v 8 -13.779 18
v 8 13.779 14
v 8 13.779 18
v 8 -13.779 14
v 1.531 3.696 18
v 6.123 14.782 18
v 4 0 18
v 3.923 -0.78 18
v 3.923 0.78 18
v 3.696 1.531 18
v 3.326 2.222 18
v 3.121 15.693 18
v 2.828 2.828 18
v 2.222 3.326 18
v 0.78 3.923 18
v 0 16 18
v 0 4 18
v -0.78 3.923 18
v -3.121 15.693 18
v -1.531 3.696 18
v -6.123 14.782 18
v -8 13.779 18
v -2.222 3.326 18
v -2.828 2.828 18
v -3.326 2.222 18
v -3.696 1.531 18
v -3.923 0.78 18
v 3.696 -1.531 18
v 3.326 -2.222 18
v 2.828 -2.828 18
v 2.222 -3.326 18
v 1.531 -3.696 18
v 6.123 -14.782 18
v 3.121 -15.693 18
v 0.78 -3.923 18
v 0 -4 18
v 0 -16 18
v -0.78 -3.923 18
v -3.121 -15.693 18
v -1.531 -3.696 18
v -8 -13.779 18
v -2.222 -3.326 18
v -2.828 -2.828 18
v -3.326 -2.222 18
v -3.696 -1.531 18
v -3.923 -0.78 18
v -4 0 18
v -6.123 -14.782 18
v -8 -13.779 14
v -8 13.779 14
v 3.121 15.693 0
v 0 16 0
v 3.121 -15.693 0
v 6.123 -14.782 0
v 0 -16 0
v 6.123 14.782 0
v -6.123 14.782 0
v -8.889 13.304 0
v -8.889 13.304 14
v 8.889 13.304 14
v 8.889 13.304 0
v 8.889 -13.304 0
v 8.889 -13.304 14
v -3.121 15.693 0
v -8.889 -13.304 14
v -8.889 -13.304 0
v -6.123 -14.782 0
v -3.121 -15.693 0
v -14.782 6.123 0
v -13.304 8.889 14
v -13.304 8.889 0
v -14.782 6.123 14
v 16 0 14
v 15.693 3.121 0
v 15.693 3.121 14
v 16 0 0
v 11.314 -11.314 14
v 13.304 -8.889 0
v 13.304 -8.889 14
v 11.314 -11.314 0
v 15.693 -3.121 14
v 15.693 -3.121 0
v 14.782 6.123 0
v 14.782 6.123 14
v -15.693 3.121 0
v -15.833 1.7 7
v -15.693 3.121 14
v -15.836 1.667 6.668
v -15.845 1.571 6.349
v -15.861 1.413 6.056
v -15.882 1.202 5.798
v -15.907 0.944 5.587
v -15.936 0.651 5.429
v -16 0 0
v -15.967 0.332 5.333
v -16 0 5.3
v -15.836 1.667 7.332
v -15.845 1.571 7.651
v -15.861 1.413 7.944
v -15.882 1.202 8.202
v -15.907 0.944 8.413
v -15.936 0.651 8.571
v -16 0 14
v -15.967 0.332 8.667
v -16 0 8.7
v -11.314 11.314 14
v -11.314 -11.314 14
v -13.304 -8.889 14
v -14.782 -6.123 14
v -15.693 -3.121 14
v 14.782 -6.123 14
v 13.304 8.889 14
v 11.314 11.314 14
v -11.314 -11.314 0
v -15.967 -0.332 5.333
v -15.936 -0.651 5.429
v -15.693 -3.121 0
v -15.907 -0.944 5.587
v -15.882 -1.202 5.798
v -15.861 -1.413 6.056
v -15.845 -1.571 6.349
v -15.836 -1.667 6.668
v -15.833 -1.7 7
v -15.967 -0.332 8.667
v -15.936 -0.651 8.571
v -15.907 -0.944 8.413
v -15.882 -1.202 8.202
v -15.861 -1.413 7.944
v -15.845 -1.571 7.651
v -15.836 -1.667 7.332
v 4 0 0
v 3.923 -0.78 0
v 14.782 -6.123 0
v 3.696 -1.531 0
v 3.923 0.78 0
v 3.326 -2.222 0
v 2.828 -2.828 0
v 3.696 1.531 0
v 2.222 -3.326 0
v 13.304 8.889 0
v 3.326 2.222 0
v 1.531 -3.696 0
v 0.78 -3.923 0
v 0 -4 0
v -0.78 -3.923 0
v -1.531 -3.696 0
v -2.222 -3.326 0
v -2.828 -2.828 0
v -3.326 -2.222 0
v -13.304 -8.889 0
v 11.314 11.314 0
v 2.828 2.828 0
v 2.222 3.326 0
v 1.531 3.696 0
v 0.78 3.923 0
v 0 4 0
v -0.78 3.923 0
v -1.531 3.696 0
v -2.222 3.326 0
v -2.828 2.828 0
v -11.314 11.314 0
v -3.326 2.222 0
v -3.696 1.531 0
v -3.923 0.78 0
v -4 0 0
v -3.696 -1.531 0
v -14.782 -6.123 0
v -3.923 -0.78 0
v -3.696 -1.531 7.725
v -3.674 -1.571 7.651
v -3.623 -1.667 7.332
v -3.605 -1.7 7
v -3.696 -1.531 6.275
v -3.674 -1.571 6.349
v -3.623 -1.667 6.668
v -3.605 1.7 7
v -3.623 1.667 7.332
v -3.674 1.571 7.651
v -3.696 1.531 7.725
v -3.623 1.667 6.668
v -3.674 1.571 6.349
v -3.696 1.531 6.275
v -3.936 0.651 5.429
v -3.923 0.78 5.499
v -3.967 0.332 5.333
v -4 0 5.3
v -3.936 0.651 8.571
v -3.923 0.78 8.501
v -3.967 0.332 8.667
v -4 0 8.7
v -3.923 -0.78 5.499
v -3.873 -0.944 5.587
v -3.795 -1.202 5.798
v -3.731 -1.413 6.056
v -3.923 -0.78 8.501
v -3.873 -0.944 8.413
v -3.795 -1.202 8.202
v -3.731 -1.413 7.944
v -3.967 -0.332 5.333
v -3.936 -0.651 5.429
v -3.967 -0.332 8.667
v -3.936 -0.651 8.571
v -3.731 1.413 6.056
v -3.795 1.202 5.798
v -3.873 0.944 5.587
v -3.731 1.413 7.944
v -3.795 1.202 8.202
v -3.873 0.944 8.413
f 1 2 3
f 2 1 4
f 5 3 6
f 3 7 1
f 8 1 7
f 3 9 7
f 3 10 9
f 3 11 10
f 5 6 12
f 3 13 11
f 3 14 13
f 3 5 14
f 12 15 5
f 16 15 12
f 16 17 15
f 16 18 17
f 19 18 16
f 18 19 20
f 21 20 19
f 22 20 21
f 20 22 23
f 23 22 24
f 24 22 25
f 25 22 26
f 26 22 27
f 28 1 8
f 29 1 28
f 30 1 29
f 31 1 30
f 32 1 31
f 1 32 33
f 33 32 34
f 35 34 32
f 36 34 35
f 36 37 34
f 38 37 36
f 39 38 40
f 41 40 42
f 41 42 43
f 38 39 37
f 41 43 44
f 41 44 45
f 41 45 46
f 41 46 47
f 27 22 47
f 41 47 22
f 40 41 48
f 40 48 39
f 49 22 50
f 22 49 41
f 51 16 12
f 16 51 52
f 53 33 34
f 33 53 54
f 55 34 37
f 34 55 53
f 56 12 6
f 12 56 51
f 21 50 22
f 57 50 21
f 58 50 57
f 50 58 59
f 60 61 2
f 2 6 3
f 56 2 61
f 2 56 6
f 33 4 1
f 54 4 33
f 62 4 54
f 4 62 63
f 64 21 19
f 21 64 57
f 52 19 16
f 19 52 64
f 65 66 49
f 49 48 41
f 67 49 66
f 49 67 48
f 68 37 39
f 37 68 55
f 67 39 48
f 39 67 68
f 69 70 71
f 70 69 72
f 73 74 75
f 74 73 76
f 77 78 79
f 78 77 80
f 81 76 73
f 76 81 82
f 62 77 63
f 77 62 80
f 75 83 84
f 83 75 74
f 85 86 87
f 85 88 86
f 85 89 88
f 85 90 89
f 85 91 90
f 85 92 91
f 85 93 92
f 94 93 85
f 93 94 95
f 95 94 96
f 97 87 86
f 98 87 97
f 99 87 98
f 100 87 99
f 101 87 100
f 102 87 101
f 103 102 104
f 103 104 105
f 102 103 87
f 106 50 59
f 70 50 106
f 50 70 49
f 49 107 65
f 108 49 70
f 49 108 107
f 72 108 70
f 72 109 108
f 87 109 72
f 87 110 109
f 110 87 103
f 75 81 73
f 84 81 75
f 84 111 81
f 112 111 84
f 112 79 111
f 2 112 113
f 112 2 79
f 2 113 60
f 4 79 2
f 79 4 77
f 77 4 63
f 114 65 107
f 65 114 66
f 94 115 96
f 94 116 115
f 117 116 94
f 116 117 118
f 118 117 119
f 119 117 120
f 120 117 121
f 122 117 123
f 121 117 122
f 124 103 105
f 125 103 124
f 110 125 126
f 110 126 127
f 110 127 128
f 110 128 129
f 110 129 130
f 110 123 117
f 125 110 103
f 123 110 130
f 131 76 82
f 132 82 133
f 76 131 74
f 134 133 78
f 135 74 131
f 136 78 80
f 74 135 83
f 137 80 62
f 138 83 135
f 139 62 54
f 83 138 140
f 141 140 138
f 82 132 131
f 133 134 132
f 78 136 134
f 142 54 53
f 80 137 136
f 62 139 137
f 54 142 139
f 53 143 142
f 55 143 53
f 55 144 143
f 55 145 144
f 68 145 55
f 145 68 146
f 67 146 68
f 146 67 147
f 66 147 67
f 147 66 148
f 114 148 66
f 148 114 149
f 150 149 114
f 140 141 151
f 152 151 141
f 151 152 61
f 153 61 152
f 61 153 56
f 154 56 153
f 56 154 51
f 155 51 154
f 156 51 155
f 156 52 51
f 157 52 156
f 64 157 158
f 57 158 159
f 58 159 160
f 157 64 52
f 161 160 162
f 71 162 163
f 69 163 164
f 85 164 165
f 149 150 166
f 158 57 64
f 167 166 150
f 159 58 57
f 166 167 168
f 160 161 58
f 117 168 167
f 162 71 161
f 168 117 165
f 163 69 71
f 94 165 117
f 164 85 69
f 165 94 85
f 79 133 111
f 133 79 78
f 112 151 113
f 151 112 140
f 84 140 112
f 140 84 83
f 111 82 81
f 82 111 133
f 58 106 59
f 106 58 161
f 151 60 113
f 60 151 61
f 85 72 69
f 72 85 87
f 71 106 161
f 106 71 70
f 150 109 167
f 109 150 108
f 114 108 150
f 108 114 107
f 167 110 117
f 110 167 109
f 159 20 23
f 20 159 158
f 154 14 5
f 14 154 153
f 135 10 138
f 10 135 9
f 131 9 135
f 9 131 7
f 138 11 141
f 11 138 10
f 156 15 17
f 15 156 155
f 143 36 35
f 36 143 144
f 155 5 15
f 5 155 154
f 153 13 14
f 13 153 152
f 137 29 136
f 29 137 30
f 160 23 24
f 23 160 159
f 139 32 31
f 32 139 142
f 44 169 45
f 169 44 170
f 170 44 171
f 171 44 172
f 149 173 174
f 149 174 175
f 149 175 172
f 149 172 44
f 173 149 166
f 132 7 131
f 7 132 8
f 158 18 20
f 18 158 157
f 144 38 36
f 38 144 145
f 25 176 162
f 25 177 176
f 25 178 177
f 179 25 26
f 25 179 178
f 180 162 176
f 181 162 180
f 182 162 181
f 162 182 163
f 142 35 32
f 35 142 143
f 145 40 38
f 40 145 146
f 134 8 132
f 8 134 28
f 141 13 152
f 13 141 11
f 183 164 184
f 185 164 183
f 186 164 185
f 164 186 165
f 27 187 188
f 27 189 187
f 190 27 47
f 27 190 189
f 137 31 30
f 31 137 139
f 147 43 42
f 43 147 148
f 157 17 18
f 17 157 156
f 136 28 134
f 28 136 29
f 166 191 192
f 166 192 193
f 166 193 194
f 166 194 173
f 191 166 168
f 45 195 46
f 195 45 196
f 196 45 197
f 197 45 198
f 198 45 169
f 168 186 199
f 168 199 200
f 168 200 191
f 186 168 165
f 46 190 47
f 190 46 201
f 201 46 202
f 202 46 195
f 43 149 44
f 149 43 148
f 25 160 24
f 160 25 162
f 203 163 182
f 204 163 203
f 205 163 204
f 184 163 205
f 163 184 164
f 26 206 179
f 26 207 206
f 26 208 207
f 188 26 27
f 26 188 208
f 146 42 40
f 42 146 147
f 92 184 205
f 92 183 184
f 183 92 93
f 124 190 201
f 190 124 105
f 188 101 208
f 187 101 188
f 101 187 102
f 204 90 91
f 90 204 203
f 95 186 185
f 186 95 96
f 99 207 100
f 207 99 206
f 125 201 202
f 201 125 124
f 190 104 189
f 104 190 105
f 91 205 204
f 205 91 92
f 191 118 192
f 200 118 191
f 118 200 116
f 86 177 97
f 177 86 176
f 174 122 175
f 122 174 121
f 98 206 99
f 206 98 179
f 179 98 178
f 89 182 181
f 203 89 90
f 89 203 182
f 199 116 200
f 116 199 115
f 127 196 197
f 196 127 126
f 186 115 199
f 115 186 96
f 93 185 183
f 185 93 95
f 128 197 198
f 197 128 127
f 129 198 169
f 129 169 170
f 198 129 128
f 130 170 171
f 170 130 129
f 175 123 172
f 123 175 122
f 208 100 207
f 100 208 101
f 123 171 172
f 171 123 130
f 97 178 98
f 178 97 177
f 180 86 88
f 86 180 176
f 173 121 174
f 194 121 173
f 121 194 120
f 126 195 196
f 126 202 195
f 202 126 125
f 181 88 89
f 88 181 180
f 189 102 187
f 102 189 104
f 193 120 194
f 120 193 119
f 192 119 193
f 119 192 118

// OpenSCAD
$fn = 32;

// ----------------------------------------------------------------------
// Oldham coupling hub: 32 x 18 mm
// ----------------------------------------------------------------------

// --- parameters (mm) ---
body_d = 32;              // hub diameter
body_l = 14;              // hub length
shaft_d = 8;              // shaft bore
cam_w = 16;               // drive tongue width
tongue_h = 4;             // drive tongue height
set_d = 3.4;              // set screw tap hole

module hub() {
  cylinder(h = body_l, d = body_d);
  /* tongue, clipped to the hub disc and sunk 1 mm into the face */
  intersection() {
    translate([-cam_w / 2, -body_d / 2, body_l - 1])
      cube([cam_w, body_d, tongue_h + 1]);
    translate([0, 0, body_l - 1]) cylinder(h = tongue_h + 1, d = body_d);
  }
}

difference() {
  hub();
  translate([0, 0, -1]) cylinder(h = body_l + tongue_h + 2, d = shaft_d);
  translate([-body_d / 2 - 1, 0, body_l * 0.5])
    rotate([0, 90, 0]) cylinder(h = body_d / 2 + 2, d = set_d);
}
